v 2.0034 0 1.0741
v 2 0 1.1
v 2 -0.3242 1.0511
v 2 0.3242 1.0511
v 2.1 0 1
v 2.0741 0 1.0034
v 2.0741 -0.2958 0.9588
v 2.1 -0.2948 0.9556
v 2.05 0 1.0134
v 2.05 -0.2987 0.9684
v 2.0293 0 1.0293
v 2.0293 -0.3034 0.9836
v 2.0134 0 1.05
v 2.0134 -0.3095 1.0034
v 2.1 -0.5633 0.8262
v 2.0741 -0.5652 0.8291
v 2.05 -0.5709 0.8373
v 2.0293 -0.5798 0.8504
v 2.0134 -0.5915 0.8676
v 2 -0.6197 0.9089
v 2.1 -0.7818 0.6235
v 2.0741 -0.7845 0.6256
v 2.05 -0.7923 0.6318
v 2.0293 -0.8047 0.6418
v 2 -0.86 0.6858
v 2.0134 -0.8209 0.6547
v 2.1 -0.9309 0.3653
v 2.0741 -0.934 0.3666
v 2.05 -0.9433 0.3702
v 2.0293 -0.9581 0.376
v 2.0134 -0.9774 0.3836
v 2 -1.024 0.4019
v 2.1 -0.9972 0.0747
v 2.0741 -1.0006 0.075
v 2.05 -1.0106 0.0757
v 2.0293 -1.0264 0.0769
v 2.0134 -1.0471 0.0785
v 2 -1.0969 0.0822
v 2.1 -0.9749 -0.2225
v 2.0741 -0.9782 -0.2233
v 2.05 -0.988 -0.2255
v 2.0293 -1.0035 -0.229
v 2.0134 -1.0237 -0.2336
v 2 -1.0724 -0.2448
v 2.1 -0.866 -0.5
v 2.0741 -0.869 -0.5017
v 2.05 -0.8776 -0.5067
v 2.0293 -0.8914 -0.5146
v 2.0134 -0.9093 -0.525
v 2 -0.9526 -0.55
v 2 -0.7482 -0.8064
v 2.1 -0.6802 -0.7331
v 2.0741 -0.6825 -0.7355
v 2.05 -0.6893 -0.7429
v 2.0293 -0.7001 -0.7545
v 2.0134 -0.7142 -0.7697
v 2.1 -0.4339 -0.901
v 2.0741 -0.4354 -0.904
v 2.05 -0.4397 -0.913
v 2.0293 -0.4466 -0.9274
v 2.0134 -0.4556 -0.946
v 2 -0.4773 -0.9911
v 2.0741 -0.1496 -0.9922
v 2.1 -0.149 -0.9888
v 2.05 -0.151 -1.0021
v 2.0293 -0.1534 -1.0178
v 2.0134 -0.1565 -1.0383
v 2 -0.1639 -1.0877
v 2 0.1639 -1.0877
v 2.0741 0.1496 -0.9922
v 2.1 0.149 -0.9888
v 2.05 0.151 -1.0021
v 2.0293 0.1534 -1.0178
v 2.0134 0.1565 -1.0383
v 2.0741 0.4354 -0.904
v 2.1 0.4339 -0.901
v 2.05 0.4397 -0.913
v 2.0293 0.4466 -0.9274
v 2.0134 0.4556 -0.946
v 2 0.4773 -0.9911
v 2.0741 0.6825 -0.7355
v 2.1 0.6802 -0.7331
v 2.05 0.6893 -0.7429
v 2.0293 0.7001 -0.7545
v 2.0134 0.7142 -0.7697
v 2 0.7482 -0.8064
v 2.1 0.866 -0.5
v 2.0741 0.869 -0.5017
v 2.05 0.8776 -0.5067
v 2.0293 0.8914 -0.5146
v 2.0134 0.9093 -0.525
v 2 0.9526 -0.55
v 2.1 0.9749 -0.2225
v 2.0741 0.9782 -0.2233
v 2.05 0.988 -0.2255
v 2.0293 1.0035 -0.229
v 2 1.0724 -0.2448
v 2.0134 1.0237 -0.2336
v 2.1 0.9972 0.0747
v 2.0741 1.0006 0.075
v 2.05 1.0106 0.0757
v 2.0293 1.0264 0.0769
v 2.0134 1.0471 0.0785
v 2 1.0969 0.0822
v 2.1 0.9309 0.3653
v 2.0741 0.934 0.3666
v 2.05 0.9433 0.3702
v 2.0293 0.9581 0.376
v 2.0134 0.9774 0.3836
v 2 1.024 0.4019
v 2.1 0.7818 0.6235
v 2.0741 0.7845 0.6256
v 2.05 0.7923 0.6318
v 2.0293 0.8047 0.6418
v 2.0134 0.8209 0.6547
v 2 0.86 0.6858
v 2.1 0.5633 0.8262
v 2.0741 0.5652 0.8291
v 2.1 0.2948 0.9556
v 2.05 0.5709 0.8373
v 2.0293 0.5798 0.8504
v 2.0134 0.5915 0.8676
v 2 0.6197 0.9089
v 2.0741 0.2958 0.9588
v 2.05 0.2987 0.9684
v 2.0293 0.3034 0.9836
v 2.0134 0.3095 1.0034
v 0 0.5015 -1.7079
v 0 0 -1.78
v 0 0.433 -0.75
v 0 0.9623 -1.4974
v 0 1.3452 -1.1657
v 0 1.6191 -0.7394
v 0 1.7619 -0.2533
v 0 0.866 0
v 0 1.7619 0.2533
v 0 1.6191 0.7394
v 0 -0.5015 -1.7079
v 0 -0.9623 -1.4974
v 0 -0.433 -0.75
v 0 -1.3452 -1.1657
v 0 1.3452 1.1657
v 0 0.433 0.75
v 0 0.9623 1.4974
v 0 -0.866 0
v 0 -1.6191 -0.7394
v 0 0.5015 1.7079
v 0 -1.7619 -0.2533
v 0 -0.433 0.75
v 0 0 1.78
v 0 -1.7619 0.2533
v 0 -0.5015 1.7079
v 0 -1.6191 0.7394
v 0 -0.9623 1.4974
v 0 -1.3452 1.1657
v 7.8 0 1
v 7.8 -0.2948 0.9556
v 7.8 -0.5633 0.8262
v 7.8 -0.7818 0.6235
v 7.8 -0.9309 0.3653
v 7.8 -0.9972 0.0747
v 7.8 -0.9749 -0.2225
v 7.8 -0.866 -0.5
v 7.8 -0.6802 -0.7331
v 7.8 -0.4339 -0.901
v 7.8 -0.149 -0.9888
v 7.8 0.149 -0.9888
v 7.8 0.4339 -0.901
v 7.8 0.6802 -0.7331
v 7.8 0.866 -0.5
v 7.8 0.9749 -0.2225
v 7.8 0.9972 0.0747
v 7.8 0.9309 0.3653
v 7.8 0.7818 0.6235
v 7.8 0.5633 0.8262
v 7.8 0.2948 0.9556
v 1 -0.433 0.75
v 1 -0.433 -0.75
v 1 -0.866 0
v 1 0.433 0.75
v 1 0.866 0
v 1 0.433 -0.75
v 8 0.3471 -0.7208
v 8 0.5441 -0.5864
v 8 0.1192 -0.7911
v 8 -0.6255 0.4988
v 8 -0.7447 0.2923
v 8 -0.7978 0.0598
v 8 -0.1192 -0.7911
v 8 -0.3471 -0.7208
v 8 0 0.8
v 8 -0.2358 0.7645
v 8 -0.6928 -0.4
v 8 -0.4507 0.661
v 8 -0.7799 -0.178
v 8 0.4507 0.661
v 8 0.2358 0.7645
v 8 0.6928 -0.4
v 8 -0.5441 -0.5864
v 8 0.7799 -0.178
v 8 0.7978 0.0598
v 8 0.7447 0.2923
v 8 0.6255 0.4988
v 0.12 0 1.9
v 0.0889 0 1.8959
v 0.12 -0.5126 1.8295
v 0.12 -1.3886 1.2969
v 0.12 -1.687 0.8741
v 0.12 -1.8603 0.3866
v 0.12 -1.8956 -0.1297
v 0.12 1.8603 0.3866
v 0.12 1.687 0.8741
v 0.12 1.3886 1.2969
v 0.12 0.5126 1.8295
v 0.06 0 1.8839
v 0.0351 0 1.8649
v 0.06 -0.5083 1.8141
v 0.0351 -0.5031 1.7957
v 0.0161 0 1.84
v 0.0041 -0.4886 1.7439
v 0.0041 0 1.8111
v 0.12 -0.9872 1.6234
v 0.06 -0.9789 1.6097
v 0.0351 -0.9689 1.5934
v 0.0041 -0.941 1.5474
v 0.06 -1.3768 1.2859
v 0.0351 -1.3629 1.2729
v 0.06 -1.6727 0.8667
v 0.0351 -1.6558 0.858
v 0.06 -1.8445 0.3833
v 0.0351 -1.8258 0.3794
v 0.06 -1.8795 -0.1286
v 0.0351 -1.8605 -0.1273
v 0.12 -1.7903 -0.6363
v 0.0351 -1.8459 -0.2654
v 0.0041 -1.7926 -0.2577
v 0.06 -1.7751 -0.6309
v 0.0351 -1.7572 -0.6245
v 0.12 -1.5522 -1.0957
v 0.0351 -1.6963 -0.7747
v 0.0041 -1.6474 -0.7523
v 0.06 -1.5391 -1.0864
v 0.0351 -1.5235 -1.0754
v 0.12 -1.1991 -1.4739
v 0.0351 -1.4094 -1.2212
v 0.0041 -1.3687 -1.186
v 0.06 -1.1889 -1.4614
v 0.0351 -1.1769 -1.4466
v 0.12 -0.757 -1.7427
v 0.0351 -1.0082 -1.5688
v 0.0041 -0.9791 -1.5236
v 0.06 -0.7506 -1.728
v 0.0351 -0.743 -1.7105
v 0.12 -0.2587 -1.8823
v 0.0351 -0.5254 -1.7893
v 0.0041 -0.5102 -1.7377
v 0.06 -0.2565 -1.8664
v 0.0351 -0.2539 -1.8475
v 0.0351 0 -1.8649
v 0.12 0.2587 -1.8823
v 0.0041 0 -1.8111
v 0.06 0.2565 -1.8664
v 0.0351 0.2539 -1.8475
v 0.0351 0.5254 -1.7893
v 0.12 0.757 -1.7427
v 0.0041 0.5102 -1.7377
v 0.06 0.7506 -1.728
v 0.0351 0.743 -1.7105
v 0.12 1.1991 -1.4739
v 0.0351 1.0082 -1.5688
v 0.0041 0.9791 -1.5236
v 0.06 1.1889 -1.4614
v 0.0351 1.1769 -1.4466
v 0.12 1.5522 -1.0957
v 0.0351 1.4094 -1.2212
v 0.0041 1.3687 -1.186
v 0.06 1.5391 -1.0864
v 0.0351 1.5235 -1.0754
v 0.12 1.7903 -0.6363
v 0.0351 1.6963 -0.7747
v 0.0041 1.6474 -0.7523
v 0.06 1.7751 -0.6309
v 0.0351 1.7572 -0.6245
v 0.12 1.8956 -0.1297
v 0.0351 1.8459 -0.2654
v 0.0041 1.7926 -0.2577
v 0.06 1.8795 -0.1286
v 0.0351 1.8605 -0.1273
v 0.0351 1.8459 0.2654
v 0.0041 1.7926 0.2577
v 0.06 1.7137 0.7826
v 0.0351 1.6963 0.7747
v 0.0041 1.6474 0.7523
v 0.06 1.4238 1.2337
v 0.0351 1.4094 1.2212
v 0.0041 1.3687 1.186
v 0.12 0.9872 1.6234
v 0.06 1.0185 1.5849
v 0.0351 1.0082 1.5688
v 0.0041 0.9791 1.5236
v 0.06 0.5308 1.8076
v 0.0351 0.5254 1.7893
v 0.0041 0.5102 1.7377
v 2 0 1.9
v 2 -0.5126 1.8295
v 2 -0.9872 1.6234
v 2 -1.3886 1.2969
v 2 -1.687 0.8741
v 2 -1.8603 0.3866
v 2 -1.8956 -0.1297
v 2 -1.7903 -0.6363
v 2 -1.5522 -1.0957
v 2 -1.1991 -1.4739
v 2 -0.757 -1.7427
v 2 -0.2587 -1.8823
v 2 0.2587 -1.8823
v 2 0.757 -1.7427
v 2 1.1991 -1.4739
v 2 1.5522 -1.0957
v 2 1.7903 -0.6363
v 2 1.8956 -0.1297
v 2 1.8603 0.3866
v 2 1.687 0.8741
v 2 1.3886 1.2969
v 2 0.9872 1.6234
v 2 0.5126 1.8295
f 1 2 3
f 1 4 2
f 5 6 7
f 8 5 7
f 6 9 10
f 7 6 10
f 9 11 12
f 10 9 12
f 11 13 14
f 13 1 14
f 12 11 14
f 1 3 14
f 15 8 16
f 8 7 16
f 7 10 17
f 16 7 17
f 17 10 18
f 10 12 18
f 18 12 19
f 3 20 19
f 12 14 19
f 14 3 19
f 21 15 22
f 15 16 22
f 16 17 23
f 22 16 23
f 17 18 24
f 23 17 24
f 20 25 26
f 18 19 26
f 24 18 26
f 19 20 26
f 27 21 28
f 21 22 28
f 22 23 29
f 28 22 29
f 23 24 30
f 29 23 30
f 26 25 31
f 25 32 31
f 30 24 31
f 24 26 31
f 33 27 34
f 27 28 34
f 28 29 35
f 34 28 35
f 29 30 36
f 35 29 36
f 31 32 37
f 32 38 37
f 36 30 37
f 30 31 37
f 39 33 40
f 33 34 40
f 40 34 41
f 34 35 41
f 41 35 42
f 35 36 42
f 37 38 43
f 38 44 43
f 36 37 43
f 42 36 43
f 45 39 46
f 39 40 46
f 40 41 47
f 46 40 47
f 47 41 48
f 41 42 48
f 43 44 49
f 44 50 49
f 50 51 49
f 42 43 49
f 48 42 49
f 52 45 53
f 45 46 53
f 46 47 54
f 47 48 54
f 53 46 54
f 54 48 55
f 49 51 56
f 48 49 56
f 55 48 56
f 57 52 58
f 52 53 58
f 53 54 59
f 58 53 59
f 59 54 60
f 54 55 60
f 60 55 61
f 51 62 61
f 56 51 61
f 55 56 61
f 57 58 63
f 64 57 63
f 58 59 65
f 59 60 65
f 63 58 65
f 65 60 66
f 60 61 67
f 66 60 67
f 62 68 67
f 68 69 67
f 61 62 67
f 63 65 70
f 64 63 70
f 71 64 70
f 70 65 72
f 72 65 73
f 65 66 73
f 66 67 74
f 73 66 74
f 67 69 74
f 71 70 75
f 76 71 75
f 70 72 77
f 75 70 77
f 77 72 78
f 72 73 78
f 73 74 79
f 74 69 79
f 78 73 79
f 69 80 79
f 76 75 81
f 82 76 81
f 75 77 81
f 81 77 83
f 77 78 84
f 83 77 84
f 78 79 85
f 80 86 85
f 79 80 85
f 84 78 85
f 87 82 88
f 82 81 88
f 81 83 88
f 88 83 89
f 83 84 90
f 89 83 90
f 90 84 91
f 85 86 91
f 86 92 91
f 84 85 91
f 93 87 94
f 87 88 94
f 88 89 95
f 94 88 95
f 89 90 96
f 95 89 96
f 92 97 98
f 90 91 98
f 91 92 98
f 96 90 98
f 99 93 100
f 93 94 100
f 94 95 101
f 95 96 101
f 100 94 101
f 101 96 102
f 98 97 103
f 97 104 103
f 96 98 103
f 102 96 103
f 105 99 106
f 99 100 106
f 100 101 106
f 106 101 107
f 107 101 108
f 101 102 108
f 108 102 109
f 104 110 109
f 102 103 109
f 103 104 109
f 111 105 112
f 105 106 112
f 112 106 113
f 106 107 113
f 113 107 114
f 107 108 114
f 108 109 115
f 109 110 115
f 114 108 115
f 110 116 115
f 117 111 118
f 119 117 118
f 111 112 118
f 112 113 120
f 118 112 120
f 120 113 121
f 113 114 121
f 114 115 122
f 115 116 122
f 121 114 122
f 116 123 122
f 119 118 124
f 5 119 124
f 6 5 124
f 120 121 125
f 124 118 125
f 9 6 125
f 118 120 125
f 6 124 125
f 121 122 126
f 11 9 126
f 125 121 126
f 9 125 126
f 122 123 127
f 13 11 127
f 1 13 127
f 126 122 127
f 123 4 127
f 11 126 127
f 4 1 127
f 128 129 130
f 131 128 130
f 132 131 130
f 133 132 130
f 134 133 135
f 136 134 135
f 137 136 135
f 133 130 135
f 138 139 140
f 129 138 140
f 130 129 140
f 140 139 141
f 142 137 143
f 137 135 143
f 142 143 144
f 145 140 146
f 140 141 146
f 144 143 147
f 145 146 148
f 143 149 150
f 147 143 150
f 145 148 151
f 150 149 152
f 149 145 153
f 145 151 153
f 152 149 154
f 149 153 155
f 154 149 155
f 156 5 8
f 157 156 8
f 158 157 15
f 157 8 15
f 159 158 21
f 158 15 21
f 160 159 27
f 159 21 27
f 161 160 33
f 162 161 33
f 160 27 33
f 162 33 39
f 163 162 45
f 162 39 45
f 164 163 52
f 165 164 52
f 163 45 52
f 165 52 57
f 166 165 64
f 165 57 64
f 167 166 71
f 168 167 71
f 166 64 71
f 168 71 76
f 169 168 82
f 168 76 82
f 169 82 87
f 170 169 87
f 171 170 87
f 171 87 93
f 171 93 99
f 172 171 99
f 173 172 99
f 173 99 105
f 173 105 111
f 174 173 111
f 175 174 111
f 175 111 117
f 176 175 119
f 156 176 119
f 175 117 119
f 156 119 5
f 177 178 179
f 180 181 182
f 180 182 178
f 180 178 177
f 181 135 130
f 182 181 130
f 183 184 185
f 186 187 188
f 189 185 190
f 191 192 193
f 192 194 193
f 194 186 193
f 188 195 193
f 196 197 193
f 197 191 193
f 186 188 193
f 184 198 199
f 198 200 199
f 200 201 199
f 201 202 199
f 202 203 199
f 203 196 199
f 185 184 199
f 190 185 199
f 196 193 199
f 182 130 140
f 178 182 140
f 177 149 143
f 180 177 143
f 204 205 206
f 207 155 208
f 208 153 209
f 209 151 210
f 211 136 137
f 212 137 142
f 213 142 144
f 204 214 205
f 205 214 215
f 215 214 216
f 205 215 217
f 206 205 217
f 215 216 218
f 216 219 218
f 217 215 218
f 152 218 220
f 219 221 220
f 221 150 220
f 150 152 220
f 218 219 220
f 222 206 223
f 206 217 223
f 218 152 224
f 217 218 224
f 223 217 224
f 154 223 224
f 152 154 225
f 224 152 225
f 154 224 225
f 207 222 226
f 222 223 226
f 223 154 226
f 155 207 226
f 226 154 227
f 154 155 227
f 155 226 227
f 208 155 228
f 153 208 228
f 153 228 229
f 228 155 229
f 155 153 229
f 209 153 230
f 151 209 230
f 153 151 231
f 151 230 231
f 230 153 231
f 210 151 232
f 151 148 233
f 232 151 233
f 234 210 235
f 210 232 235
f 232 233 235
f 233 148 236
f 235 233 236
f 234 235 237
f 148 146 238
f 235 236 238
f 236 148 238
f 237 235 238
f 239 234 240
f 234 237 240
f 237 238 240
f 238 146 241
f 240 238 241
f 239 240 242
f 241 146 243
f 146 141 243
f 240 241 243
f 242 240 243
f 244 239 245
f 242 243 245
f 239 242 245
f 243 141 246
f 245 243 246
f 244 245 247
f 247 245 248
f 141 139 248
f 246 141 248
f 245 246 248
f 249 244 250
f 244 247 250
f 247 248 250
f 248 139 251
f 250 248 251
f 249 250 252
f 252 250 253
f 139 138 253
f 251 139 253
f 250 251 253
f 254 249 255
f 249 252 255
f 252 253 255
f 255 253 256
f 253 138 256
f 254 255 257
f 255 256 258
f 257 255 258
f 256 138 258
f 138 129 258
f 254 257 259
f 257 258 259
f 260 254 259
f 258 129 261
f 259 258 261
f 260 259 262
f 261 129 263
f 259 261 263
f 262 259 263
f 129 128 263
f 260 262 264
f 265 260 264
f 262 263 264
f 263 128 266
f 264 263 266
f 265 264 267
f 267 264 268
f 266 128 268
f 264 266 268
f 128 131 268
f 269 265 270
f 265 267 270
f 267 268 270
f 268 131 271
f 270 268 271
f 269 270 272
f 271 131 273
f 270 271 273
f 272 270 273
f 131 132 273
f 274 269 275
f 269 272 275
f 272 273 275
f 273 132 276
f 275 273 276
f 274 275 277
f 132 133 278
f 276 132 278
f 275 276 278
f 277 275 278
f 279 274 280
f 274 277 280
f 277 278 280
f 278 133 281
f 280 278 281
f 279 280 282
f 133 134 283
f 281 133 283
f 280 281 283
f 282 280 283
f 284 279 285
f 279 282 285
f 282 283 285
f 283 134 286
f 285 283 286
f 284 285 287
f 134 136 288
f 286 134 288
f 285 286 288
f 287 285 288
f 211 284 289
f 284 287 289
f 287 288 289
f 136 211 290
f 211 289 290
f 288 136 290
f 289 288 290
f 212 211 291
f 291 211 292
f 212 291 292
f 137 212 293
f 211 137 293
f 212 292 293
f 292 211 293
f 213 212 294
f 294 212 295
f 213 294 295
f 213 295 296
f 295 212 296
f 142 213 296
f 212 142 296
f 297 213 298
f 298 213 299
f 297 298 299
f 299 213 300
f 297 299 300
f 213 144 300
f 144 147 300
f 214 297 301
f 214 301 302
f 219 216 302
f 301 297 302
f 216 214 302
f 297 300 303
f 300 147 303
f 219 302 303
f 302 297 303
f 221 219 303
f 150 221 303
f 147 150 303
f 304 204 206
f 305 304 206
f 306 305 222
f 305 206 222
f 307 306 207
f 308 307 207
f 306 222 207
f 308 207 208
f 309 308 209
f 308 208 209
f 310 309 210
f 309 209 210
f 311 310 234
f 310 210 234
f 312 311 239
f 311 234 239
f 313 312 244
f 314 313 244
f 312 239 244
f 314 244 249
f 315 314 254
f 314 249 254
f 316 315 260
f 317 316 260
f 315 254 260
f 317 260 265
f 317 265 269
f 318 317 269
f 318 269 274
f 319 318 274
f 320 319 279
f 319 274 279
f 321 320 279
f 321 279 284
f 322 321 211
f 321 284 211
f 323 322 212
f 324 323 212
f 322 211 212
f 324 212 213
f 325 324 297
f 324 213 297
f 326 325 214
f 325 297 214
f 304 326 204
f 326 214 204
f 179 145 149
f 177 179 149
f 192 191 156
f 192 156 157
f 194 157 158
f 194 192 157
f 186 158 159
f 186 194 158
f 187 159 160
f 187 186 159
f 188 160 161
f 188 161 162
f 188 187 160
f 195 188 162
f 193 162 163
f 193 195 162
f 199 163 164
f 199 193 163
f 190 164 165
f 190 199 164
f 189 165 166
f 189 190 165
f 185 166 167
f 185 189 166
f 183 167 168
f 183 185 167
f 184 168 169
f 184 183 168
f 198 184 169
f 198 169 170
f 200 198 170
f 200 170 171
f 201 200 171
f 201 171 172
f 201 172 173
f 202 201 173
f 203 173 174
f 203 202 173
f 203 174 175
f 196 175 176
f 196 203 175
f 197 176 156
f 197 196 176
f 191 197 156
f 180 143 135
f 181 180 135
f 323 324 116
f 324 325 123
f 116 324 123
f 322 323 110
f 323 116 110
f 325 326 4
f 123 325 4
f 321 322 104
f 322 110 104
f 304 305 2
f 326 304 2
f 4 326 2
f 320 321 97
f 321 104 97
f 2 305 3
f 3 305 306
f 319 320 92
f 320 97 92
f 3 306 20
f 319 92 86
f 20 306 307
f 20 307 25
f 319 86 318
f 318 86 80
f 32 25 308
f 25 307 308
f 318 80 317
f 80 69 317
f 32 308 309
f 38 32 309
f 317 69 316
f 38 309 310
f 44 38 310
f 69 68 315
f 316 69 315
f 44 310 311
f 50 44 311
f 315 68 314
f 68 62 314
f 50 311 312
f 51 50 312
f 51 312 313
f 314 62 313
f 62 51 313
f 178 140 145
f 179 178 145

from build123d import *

# Parameters (mm, degrees)
FILLET1_R      = 0.1
FILLET2_R      = 0.12
CHAMFER1_SIZE  = 0.2
EXTRUDE1_DEPTH = 1


with BuildPart() as part:
    # Sketch1 → Revolve1 (revolve)
    with BuildSketch(Plane.XY, mode=Mode.PRIVATE) as revolve1_sk:
        Polygon((2, 1), (2, 0), (4.279914881, 0), (8, 0), (8, 1), align=None)
        Polygon((0, 1.9), (0, 0), (2, 0), (2, 1), (2, 1.9), align=None)
    revolve(revolve1_sk.sketch.rotate(Axis((0, 0, 0), (1, 0, 0)), 90), axis=Axis((0, 0, 0), (1, 0, 0)))

    # Fillet1
    fillet1_edges = [part.edges().sort_by_distance(p)[0] for p in [
        (2, 0, -1),
    ]]
    fillet(fillet1_edges, radius=FILLET1_R)

    # Fillet2
    fillet2_edges = [part.edges().sort_by_distance(p)[0] for p in [
        (0, 0, -1.9),
    ]]
    fillet(fillet2_edges, radius=FILLET2_R)

    # Chamfer1
    chamfer1_edges = [part.edges().sort_by_distance(p)[0] for p in [
        (8, 0, -1),
    ]]
    chamfer(chamfer1_edges, length=CHAMFER1_SIZE)

    # Sketch2 → Extrude1 (cut)
    with BuildSketch(Plane.ZY):
        Polygon((0, 0.866025404), (-0.75, 0.433012702), (-0.75, -0.433012702), (0, -0.866025404), (0.75, -0.433012702), (0.75, 0.433012702), align=None)
    extrude(amount=-EXTRUDE1_DEPTH, mode=Mode.SUBTRACT)


solid = part.part
